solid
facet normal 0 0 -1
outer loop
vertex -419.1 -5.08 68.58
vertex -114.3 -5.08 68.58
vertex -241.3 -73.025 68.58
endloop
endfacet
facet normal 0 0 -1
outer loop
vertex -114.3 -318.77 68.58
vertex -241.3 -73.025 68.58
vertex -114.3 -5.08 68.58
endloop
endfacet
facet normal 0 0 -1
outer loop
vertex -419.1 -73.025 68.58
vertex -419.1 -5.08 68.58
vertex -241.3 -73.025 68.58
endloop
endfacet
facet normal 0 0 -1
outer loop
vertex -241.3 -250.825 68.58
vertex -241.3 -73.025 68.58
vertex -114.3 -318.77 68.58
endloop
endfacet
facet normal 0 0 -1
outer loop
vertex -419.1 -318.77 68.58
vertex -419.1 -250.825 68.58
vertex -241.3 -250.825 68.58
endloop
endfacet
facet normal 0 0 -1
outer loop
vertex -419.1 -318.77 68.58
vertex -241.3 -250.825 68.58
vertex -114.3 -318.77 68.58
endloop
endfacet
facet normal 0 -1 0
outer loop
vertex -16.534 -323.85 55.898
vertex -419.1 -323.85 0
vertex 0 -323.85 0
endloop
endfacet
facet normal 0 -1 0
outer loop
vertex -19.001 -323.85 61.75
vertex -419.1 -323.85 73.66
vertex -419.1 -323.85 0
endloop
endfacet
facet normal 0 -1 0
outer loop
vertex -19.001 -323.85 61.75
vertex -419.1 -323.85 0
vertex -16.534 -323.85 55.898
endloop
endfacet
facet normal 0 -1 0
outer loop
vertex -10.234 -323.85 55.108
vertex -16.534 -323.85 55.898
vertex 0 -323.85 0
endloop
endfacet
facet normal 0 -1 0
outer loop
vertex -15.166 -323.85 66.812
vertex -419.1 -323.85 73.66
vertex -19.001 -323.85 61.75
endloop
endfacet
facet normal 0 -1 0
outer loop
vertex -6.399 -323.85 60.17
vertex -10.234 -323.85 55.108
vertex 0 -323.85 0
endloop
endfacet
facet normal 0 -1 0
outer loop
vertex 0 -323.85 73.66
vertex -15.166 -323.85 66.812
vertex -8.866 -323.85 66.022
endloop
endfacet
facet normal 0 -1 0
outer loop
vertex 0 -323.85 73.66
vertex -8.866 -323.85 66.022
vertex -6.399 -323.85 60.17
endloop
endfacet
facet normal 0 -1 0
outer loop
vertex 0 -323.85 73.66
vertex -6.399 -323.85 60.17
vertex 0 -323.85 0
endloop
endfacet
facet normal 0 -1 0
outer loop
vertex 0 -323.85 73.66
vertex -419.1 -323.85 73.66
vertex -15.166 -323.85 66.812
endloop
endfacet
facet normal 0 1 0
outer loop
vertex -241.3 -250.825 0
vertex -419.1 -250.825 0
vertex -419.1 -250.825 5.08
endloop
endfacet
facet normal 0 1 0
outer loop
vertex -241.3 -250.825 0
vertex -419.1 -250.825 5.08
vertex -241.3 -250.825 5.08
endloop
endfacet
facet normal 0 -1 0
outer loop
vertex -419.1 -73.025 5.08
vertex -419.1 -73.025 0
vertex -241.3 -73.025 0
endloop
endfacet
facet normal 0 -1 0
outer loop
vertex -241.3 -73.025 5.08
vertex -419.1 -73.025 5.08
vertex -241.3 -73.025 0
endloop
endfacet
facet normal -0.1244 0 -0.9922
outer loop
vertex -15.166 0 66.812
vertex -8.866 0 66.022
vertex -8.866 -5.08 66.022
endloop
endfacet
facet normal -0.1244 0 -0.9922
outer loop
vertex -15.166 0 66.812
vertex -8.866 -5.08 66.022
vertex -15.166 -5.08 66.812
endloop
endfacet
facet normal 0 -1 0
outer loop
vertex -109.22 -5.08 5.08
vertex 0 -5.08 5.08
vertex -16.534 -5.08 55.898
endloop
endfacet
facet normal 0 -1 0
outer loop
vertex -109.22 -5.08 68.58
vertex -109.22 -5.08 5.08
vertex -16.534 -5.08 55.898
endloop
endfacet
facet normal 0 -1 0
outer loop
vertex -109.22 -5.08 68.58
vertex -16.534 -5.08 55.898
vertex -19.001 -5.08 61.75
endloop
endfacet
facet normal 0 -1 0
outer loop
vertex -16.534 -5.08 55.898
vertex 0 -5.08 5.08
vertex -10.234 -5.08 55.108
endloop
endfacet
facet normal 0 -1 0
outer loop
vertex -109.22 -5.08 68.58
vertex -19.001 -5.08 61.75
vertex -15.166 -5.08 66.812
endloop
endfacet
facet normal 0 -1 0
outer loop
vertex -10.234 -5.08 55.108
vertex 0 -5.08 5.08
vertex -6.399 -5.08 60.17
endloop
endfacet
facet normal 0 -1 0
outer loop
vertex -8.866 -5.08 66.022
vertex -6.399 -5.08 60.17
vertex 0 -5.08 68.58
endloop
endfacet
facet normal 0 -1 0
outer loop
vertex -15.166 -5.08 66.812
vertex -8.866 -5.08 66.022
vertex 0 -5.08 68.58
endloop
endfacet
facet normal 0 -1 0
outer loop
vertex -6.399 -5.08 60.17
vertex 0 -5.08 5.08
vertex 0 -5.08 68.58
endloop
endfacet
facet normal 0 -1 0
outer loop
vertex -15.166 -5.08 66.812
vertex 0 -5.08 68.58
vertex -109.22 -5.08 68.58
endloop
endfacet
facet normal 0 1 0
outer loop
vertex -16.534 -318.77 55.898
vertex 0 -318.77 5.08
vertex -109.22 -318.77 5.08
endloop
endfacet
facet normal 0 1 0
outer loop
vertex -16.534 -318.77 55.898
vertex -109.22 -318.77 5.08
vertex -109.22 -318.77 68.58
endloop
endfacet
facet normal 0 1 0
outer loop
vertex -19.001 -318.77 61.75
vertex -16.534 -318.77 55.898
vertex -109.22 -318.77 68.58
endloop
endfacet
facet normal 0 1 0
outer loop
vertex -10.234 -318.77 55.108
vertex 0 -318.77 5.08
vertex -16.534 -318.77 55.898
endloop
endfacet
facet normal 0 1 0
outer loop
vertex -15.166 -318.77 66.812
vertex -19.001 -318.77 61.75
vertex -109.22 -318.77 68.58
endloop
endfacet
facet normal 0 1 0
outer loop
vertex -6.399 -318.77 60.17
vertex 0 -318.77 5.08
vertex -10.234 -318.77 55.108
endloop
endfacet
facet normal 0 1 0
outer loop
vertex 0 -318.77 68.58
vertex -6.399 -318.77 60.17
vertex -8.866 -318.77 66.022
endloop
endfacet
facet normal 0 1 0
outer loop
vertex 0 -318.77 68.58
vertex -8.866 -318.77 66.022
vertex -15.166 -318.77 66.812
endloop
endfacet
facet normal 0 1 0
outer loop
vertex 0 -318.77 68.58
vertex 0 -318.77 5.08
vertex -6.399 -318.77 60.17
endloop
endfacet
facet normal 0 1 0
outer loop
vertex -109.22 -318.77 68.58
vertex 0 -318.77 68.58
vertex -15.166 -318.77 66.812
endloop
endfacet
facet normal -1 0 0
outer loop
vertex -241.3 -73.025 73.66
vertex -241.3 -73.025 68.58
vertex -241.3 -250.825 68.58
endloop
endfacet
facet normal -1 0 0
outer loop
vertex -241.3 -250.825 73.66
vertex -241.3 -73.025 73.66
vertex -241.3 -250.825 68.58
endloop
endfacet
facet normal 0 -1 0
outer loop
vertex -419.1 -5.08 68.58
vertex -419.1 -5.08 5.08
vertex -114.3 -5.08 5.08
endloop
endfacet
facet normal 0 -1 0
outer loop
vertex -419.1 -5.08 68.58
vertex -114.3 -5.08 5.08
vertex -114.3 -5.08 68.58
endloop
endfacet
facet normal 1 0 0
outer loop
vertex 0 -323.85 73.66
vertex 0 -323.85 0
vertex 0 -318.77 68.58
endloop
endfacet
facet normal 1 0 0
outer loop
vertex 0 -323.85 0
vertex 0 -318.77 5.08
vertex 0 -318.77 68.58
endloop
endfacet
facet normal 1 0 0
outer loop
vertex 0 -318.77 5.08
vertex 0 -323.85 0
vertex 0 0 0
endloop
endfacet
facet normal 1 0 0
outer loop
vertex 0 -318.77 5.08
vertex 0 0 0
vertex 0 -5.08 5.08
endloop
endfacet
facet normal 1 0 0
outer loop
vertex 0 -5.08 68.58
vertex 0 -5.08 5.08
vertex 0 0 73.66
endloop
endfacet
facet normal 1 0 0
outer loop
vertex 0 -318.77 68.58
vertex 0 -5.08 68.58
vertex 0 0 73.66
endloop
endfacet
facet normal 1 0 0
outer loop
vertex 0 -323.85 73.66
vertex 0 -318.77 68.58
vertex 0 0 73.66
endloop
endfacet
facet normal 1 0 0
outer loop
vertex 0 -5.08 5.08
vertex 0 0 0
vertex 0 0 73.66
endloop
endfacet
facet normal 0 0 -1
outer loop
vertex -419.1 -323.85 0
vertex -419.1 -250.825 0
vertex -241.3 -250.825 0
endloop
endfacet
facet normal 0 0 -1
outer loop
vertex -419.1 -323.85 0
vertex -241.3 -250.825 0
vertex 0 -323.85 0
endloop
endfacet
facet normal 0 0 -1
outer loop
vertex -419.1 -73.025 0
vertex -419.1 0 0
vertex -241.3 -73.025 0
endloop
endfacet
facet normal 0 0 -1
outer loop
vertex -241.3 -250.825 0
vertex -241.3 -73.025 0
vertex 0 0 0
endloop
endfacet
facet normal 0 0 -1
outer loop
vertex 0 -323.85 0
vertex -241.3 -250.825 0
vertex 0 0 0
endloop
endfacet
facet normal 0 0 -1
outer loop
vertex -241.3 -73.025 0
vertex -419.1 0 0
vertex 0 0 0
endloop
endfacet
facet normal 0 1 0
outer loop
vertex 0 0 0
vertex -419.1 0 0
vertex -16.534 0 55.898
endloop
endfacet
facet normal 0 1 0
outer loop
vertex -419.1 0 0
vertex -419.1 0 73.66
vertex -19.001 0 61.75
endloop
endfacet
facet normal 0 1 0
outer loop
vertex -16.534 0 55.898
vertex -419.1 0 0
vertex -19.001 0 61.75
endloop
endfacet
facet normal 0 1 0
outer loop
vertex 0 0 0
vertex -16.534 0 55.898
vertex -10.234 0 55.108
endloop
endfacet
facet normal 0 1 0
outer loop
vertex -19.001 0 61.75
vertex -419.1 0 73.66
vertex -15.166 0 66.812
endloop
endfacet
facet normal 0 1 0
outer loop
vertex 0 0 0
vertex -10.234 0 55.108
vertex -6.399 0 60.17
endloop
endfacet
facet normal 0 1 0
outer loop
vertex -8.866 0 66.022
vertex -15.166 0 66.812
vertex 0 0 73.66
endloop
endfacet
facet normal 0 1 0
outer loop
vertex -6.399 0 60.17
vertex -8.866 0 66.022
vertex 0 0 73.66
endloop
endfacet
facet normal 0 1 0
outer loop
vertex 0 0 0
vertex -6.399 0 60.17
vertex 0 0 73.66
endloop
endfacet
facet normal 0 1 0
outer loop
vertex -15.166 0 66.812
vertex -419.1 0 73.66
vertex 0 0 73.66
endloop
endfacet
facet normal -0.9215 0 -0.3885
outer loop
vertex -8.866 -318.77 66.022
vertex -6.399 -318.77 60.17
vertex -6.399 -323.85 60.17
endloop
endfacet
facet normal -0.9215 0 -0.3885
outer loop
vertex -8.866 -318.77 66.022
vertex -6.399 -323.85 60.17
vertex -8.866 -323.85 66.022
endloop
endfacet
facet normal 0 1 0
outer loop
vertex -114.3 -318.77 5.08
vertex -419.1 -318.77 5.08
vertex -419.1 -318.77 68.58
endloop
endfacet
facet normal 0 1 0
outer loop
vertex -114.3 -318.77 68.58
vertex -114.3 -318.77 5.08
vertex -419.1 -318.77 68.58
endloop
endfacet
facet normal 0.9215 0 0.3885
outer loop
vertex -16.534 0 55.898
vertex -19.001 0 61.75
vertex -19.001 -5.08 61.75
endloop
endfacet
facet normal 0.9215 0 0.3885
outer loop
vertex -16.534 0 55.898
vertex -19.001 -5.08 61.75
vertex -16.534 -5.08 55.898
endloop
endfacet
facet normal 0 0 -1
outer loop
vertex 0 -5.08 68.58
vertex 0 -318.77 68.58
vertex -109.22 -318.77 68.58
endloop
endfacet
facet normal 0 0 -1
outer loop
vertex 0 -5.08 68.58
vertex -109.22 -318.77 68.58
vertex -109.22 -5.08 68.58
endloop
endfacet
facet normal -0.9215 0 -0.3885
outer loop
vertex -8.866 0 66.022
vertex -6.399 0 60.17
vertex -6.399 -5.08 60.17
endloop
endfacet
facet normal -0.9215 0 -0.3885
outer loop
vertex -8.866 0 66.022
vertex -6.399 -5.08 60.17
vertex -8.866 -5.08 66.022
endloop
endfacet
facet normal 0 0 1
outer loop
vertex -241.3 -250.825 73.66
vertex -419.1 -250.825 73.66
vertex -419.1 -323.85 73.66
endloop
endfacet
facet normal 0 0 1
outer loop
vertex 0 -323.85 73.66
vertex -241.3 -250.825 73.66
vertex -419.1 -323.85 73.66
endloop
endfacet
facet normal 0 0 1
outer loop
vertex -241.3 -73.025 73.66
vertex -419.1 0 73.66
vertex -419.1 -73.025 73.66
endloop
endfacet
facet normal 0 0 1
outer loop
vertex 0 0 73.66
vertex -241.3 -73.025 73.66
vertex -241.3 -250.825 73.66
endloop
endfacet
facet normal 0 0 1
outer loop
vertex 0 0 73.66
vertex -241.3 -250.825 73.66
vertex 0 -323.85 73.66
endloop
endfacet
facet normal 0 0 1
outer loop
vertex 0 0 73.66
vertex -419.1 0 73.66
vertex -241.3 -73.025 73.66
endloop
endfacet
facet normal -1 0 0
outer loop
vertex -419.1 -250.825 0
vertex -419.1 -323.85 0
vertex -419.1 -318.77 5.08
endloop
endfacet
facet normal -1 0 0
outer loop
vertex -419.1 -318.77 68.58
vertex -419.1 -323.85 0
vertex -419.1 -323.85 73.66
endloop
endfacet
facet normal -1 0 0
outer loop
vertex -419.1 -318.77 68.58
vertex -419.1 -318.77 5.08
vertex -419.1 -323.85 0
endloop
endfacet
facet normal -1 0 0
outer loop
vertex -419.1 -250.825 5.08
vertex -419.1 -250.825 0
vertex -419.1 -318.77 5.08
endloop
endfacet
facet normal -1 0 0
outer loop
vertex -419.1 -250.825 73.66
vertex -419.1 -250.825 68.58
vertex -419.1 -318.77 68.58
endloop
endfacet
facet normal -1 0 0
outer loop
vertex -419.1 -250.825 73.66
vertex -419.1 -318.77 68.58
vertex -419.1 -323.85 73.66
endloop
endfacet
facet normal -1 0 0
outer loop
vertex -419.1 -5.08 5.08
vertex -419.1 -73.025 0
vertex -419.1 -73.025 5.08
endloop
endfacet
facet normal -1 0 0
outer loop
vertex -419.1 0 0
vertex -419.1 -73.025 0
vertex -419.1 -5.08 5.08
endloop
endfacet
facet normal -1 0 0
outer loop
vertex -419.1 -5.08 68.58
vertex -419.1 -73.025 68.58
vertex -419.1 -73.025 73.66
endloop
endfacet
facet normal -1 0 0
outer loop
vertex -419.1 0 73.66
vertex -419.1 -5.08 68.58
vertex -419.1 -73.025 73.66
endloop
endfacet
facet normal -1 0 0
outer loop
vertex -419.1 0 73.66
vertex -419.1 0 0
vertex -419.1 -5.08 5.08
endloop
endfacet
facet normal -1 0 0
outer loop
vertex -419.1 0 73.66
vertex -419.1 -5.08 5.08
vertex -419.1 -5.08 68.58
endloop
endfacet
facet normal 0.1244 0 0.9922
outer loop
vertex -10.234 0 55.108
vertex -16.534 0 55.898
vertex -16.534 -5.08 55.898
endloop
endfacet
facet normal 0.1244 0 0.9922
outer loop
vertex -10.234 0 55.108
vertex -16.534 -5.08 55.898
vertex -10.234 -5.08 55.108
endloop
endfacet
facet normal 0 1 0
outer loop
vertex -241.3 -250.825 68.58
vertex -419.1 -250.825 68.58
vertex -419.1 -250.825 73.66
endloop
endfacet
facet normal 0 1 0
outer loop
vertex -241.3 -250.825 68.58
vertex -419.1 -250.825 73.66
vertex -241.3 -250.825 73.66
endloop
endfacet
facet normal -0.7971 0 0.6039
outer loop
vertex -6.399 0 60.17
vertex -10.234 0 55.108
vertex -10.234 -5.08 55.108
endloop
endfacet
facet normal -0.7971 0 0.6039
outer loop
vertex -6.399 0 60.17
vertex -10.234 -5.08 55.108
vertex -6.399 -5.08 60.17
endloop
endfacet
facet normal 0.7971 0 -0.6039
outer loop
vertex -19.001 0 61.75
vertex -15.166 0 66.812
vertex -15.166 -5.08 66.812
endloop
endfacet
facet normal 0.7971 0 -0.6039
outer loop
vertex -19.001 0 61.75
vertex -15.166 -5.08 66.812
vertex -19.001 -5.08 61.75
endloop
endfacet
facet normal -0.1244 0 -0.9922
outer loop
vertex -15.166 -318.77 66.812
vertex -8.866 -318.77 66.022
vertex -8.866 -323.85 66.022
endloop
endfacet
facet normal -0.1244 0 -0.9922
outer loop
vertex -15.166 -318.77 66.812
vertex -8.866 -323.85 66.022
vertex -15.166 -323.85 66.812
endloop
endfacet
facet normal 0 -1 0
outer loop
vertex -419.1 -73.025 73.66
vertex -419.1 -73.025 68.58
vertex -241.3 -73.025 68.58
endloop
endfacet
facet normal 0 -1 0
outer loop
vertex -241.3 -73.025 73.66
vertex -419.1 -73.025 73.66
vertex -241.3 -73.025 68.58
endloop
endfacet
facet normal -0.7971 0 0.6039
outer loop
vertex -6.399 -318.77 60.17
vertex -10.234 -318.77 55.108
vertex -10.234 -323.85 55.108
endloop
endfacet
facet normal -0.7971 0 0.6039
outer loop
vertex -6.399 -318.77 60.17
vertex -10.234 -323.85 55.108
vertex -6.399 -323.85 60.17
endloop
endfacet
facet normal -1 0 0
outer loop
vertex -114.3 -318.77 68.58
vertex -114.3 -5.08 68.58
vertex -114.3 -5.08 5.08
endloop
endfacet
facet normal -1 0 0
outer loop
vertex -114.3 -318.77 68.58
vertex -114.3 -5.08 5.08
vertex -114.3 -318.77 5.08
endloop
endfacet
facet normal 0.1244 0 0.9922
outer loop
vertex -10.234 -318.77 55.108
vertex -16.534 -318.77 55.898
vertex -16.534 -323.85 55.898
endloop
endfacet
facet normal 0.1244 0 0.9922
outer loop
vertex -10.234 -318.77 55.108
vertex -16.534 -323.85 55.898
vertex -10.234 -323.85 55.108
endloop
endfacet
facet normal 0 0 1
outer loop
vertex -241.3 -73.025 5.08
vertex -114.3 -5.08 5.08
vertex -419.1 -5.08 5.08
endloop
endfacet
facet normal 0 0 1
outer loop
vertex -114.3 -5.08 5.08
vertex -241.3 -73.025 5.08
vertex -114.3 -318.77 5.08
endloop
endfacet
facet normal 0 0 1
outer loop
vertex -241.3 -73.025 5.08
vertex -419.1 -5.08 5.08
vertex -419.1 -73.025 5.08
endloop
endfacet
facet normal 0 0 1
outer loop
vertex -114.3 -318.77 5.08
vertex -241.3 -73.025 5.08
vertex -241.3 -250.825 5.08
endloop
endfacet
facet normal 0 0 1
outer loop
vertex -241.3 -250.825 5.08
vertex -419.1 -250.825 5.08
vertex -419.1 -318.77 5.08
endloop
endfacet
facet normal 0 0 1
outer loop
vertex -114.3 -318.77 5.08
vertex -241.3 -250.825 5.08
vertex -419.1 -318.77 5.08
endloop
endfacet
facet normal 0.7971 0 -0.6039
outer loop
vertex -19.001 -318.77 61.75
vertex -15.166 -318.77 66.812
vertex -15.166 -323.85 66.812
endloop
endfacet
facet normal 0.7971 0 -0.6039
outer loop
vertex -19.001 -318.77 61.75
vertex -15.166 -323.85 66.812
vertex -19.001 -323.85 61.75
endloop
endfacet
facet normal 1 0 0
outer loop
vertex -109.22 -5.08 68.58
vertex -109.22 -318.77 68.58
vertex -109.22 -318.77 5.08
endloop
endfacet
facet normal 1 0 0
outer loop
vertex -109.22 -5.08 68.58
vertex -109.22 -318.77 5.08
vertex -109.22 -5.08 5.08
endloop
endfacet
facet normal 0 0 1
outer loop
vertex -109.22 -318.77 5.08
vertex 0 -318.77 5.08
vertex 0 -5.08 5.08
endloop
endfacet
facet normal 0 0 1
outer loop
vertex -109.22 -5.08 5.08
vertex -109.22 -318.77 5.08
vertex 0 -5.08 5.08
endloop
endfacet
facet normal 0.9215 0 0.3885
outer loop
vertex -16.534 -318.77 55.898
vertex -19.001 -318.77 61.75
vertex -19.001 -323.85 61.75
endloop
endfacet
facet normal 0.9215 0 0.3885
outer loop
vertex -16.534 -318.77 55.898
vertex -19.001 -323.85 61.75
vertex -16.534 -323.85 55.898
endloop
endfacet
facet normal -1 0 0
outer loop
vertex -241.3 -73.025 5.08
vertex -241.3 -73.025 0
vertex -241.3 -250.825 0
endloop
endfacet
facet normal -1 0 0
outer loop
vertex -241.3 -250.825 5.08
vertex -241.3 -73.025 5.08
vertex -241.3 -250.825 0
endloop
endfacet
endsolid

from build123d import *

# Parameters (mm, degrees)
F0_W     = 419.1
F0_H     = 73.66
F1_DEPTH = 323.85
F2_W     = 313.69
F2_H     = 63.5
F3_DEPTH = 304.8
F4_W     = 313.69
F4_H     = 63.5
F5_DEPTH = 109.22
F7_DEPTH = 323.85
F8_W     = 177.8
F8_H     = 177.8
F9_DEPTH = 73.661


with BuildPart() as f1:
    # F0 (on Front) → F1 (new body)
    with BuildSketch(Plane.XZ):
        with Locations((-209.55, 36.83)):
            Rectangle(F0_W, F0_H)
    extrude(amount=F1_DEPTH)

    # F2 (on face) → F3 (cut)
    with BuildSketch(Plane(origin=(-419.1, 0, 0), x_dir=(0, -1, 0), z_dir=(-1, 0, 0))):
        with Locations((161.925, 36.83)):
            Rectangle(F2_W, F2_H)
    extrude(amount=-F3_DEPTH, mode=Mode.SUBTRACT)

    # F4 (on face) → F5 (cut)
    with BuildSketch(Plane.YZ):
        with Locations((-161.925, 36.83)):
            Rectangle(F4_W, F4_H)
    extrude(amount=-F5_DEPTH, mode=Mode.SUBTRACT)

    # F6 (on face) → F7 (cut, through all)
    with BuildSketch(Plane.XZ):
        Polygon((-19.000666, 61.750006), (-16.534498, 55.898466), (-10.233832, 55.10846), (-6.399334, 60.169994), (-8.865502, 66.021534), (-15.166168, 66.81154), align=None)
    extrude(amount=F7_DEPTH, mode=Mode.SUBTRACT)

    # F8 (on face) → F9 (cut, through all)
    with BuildSketch(Plane(origin=(0, 0, 0), x_dir=(1, 0, 0), z_dir=(0, 0, -1))):
        with Locations((-330.2, 161.925)):
            Rectangle(F8_W, F8_H)
    extrude(amount=-F9_DEPTH, mode=Mode.SUBTRACT)


solid = f1.part
